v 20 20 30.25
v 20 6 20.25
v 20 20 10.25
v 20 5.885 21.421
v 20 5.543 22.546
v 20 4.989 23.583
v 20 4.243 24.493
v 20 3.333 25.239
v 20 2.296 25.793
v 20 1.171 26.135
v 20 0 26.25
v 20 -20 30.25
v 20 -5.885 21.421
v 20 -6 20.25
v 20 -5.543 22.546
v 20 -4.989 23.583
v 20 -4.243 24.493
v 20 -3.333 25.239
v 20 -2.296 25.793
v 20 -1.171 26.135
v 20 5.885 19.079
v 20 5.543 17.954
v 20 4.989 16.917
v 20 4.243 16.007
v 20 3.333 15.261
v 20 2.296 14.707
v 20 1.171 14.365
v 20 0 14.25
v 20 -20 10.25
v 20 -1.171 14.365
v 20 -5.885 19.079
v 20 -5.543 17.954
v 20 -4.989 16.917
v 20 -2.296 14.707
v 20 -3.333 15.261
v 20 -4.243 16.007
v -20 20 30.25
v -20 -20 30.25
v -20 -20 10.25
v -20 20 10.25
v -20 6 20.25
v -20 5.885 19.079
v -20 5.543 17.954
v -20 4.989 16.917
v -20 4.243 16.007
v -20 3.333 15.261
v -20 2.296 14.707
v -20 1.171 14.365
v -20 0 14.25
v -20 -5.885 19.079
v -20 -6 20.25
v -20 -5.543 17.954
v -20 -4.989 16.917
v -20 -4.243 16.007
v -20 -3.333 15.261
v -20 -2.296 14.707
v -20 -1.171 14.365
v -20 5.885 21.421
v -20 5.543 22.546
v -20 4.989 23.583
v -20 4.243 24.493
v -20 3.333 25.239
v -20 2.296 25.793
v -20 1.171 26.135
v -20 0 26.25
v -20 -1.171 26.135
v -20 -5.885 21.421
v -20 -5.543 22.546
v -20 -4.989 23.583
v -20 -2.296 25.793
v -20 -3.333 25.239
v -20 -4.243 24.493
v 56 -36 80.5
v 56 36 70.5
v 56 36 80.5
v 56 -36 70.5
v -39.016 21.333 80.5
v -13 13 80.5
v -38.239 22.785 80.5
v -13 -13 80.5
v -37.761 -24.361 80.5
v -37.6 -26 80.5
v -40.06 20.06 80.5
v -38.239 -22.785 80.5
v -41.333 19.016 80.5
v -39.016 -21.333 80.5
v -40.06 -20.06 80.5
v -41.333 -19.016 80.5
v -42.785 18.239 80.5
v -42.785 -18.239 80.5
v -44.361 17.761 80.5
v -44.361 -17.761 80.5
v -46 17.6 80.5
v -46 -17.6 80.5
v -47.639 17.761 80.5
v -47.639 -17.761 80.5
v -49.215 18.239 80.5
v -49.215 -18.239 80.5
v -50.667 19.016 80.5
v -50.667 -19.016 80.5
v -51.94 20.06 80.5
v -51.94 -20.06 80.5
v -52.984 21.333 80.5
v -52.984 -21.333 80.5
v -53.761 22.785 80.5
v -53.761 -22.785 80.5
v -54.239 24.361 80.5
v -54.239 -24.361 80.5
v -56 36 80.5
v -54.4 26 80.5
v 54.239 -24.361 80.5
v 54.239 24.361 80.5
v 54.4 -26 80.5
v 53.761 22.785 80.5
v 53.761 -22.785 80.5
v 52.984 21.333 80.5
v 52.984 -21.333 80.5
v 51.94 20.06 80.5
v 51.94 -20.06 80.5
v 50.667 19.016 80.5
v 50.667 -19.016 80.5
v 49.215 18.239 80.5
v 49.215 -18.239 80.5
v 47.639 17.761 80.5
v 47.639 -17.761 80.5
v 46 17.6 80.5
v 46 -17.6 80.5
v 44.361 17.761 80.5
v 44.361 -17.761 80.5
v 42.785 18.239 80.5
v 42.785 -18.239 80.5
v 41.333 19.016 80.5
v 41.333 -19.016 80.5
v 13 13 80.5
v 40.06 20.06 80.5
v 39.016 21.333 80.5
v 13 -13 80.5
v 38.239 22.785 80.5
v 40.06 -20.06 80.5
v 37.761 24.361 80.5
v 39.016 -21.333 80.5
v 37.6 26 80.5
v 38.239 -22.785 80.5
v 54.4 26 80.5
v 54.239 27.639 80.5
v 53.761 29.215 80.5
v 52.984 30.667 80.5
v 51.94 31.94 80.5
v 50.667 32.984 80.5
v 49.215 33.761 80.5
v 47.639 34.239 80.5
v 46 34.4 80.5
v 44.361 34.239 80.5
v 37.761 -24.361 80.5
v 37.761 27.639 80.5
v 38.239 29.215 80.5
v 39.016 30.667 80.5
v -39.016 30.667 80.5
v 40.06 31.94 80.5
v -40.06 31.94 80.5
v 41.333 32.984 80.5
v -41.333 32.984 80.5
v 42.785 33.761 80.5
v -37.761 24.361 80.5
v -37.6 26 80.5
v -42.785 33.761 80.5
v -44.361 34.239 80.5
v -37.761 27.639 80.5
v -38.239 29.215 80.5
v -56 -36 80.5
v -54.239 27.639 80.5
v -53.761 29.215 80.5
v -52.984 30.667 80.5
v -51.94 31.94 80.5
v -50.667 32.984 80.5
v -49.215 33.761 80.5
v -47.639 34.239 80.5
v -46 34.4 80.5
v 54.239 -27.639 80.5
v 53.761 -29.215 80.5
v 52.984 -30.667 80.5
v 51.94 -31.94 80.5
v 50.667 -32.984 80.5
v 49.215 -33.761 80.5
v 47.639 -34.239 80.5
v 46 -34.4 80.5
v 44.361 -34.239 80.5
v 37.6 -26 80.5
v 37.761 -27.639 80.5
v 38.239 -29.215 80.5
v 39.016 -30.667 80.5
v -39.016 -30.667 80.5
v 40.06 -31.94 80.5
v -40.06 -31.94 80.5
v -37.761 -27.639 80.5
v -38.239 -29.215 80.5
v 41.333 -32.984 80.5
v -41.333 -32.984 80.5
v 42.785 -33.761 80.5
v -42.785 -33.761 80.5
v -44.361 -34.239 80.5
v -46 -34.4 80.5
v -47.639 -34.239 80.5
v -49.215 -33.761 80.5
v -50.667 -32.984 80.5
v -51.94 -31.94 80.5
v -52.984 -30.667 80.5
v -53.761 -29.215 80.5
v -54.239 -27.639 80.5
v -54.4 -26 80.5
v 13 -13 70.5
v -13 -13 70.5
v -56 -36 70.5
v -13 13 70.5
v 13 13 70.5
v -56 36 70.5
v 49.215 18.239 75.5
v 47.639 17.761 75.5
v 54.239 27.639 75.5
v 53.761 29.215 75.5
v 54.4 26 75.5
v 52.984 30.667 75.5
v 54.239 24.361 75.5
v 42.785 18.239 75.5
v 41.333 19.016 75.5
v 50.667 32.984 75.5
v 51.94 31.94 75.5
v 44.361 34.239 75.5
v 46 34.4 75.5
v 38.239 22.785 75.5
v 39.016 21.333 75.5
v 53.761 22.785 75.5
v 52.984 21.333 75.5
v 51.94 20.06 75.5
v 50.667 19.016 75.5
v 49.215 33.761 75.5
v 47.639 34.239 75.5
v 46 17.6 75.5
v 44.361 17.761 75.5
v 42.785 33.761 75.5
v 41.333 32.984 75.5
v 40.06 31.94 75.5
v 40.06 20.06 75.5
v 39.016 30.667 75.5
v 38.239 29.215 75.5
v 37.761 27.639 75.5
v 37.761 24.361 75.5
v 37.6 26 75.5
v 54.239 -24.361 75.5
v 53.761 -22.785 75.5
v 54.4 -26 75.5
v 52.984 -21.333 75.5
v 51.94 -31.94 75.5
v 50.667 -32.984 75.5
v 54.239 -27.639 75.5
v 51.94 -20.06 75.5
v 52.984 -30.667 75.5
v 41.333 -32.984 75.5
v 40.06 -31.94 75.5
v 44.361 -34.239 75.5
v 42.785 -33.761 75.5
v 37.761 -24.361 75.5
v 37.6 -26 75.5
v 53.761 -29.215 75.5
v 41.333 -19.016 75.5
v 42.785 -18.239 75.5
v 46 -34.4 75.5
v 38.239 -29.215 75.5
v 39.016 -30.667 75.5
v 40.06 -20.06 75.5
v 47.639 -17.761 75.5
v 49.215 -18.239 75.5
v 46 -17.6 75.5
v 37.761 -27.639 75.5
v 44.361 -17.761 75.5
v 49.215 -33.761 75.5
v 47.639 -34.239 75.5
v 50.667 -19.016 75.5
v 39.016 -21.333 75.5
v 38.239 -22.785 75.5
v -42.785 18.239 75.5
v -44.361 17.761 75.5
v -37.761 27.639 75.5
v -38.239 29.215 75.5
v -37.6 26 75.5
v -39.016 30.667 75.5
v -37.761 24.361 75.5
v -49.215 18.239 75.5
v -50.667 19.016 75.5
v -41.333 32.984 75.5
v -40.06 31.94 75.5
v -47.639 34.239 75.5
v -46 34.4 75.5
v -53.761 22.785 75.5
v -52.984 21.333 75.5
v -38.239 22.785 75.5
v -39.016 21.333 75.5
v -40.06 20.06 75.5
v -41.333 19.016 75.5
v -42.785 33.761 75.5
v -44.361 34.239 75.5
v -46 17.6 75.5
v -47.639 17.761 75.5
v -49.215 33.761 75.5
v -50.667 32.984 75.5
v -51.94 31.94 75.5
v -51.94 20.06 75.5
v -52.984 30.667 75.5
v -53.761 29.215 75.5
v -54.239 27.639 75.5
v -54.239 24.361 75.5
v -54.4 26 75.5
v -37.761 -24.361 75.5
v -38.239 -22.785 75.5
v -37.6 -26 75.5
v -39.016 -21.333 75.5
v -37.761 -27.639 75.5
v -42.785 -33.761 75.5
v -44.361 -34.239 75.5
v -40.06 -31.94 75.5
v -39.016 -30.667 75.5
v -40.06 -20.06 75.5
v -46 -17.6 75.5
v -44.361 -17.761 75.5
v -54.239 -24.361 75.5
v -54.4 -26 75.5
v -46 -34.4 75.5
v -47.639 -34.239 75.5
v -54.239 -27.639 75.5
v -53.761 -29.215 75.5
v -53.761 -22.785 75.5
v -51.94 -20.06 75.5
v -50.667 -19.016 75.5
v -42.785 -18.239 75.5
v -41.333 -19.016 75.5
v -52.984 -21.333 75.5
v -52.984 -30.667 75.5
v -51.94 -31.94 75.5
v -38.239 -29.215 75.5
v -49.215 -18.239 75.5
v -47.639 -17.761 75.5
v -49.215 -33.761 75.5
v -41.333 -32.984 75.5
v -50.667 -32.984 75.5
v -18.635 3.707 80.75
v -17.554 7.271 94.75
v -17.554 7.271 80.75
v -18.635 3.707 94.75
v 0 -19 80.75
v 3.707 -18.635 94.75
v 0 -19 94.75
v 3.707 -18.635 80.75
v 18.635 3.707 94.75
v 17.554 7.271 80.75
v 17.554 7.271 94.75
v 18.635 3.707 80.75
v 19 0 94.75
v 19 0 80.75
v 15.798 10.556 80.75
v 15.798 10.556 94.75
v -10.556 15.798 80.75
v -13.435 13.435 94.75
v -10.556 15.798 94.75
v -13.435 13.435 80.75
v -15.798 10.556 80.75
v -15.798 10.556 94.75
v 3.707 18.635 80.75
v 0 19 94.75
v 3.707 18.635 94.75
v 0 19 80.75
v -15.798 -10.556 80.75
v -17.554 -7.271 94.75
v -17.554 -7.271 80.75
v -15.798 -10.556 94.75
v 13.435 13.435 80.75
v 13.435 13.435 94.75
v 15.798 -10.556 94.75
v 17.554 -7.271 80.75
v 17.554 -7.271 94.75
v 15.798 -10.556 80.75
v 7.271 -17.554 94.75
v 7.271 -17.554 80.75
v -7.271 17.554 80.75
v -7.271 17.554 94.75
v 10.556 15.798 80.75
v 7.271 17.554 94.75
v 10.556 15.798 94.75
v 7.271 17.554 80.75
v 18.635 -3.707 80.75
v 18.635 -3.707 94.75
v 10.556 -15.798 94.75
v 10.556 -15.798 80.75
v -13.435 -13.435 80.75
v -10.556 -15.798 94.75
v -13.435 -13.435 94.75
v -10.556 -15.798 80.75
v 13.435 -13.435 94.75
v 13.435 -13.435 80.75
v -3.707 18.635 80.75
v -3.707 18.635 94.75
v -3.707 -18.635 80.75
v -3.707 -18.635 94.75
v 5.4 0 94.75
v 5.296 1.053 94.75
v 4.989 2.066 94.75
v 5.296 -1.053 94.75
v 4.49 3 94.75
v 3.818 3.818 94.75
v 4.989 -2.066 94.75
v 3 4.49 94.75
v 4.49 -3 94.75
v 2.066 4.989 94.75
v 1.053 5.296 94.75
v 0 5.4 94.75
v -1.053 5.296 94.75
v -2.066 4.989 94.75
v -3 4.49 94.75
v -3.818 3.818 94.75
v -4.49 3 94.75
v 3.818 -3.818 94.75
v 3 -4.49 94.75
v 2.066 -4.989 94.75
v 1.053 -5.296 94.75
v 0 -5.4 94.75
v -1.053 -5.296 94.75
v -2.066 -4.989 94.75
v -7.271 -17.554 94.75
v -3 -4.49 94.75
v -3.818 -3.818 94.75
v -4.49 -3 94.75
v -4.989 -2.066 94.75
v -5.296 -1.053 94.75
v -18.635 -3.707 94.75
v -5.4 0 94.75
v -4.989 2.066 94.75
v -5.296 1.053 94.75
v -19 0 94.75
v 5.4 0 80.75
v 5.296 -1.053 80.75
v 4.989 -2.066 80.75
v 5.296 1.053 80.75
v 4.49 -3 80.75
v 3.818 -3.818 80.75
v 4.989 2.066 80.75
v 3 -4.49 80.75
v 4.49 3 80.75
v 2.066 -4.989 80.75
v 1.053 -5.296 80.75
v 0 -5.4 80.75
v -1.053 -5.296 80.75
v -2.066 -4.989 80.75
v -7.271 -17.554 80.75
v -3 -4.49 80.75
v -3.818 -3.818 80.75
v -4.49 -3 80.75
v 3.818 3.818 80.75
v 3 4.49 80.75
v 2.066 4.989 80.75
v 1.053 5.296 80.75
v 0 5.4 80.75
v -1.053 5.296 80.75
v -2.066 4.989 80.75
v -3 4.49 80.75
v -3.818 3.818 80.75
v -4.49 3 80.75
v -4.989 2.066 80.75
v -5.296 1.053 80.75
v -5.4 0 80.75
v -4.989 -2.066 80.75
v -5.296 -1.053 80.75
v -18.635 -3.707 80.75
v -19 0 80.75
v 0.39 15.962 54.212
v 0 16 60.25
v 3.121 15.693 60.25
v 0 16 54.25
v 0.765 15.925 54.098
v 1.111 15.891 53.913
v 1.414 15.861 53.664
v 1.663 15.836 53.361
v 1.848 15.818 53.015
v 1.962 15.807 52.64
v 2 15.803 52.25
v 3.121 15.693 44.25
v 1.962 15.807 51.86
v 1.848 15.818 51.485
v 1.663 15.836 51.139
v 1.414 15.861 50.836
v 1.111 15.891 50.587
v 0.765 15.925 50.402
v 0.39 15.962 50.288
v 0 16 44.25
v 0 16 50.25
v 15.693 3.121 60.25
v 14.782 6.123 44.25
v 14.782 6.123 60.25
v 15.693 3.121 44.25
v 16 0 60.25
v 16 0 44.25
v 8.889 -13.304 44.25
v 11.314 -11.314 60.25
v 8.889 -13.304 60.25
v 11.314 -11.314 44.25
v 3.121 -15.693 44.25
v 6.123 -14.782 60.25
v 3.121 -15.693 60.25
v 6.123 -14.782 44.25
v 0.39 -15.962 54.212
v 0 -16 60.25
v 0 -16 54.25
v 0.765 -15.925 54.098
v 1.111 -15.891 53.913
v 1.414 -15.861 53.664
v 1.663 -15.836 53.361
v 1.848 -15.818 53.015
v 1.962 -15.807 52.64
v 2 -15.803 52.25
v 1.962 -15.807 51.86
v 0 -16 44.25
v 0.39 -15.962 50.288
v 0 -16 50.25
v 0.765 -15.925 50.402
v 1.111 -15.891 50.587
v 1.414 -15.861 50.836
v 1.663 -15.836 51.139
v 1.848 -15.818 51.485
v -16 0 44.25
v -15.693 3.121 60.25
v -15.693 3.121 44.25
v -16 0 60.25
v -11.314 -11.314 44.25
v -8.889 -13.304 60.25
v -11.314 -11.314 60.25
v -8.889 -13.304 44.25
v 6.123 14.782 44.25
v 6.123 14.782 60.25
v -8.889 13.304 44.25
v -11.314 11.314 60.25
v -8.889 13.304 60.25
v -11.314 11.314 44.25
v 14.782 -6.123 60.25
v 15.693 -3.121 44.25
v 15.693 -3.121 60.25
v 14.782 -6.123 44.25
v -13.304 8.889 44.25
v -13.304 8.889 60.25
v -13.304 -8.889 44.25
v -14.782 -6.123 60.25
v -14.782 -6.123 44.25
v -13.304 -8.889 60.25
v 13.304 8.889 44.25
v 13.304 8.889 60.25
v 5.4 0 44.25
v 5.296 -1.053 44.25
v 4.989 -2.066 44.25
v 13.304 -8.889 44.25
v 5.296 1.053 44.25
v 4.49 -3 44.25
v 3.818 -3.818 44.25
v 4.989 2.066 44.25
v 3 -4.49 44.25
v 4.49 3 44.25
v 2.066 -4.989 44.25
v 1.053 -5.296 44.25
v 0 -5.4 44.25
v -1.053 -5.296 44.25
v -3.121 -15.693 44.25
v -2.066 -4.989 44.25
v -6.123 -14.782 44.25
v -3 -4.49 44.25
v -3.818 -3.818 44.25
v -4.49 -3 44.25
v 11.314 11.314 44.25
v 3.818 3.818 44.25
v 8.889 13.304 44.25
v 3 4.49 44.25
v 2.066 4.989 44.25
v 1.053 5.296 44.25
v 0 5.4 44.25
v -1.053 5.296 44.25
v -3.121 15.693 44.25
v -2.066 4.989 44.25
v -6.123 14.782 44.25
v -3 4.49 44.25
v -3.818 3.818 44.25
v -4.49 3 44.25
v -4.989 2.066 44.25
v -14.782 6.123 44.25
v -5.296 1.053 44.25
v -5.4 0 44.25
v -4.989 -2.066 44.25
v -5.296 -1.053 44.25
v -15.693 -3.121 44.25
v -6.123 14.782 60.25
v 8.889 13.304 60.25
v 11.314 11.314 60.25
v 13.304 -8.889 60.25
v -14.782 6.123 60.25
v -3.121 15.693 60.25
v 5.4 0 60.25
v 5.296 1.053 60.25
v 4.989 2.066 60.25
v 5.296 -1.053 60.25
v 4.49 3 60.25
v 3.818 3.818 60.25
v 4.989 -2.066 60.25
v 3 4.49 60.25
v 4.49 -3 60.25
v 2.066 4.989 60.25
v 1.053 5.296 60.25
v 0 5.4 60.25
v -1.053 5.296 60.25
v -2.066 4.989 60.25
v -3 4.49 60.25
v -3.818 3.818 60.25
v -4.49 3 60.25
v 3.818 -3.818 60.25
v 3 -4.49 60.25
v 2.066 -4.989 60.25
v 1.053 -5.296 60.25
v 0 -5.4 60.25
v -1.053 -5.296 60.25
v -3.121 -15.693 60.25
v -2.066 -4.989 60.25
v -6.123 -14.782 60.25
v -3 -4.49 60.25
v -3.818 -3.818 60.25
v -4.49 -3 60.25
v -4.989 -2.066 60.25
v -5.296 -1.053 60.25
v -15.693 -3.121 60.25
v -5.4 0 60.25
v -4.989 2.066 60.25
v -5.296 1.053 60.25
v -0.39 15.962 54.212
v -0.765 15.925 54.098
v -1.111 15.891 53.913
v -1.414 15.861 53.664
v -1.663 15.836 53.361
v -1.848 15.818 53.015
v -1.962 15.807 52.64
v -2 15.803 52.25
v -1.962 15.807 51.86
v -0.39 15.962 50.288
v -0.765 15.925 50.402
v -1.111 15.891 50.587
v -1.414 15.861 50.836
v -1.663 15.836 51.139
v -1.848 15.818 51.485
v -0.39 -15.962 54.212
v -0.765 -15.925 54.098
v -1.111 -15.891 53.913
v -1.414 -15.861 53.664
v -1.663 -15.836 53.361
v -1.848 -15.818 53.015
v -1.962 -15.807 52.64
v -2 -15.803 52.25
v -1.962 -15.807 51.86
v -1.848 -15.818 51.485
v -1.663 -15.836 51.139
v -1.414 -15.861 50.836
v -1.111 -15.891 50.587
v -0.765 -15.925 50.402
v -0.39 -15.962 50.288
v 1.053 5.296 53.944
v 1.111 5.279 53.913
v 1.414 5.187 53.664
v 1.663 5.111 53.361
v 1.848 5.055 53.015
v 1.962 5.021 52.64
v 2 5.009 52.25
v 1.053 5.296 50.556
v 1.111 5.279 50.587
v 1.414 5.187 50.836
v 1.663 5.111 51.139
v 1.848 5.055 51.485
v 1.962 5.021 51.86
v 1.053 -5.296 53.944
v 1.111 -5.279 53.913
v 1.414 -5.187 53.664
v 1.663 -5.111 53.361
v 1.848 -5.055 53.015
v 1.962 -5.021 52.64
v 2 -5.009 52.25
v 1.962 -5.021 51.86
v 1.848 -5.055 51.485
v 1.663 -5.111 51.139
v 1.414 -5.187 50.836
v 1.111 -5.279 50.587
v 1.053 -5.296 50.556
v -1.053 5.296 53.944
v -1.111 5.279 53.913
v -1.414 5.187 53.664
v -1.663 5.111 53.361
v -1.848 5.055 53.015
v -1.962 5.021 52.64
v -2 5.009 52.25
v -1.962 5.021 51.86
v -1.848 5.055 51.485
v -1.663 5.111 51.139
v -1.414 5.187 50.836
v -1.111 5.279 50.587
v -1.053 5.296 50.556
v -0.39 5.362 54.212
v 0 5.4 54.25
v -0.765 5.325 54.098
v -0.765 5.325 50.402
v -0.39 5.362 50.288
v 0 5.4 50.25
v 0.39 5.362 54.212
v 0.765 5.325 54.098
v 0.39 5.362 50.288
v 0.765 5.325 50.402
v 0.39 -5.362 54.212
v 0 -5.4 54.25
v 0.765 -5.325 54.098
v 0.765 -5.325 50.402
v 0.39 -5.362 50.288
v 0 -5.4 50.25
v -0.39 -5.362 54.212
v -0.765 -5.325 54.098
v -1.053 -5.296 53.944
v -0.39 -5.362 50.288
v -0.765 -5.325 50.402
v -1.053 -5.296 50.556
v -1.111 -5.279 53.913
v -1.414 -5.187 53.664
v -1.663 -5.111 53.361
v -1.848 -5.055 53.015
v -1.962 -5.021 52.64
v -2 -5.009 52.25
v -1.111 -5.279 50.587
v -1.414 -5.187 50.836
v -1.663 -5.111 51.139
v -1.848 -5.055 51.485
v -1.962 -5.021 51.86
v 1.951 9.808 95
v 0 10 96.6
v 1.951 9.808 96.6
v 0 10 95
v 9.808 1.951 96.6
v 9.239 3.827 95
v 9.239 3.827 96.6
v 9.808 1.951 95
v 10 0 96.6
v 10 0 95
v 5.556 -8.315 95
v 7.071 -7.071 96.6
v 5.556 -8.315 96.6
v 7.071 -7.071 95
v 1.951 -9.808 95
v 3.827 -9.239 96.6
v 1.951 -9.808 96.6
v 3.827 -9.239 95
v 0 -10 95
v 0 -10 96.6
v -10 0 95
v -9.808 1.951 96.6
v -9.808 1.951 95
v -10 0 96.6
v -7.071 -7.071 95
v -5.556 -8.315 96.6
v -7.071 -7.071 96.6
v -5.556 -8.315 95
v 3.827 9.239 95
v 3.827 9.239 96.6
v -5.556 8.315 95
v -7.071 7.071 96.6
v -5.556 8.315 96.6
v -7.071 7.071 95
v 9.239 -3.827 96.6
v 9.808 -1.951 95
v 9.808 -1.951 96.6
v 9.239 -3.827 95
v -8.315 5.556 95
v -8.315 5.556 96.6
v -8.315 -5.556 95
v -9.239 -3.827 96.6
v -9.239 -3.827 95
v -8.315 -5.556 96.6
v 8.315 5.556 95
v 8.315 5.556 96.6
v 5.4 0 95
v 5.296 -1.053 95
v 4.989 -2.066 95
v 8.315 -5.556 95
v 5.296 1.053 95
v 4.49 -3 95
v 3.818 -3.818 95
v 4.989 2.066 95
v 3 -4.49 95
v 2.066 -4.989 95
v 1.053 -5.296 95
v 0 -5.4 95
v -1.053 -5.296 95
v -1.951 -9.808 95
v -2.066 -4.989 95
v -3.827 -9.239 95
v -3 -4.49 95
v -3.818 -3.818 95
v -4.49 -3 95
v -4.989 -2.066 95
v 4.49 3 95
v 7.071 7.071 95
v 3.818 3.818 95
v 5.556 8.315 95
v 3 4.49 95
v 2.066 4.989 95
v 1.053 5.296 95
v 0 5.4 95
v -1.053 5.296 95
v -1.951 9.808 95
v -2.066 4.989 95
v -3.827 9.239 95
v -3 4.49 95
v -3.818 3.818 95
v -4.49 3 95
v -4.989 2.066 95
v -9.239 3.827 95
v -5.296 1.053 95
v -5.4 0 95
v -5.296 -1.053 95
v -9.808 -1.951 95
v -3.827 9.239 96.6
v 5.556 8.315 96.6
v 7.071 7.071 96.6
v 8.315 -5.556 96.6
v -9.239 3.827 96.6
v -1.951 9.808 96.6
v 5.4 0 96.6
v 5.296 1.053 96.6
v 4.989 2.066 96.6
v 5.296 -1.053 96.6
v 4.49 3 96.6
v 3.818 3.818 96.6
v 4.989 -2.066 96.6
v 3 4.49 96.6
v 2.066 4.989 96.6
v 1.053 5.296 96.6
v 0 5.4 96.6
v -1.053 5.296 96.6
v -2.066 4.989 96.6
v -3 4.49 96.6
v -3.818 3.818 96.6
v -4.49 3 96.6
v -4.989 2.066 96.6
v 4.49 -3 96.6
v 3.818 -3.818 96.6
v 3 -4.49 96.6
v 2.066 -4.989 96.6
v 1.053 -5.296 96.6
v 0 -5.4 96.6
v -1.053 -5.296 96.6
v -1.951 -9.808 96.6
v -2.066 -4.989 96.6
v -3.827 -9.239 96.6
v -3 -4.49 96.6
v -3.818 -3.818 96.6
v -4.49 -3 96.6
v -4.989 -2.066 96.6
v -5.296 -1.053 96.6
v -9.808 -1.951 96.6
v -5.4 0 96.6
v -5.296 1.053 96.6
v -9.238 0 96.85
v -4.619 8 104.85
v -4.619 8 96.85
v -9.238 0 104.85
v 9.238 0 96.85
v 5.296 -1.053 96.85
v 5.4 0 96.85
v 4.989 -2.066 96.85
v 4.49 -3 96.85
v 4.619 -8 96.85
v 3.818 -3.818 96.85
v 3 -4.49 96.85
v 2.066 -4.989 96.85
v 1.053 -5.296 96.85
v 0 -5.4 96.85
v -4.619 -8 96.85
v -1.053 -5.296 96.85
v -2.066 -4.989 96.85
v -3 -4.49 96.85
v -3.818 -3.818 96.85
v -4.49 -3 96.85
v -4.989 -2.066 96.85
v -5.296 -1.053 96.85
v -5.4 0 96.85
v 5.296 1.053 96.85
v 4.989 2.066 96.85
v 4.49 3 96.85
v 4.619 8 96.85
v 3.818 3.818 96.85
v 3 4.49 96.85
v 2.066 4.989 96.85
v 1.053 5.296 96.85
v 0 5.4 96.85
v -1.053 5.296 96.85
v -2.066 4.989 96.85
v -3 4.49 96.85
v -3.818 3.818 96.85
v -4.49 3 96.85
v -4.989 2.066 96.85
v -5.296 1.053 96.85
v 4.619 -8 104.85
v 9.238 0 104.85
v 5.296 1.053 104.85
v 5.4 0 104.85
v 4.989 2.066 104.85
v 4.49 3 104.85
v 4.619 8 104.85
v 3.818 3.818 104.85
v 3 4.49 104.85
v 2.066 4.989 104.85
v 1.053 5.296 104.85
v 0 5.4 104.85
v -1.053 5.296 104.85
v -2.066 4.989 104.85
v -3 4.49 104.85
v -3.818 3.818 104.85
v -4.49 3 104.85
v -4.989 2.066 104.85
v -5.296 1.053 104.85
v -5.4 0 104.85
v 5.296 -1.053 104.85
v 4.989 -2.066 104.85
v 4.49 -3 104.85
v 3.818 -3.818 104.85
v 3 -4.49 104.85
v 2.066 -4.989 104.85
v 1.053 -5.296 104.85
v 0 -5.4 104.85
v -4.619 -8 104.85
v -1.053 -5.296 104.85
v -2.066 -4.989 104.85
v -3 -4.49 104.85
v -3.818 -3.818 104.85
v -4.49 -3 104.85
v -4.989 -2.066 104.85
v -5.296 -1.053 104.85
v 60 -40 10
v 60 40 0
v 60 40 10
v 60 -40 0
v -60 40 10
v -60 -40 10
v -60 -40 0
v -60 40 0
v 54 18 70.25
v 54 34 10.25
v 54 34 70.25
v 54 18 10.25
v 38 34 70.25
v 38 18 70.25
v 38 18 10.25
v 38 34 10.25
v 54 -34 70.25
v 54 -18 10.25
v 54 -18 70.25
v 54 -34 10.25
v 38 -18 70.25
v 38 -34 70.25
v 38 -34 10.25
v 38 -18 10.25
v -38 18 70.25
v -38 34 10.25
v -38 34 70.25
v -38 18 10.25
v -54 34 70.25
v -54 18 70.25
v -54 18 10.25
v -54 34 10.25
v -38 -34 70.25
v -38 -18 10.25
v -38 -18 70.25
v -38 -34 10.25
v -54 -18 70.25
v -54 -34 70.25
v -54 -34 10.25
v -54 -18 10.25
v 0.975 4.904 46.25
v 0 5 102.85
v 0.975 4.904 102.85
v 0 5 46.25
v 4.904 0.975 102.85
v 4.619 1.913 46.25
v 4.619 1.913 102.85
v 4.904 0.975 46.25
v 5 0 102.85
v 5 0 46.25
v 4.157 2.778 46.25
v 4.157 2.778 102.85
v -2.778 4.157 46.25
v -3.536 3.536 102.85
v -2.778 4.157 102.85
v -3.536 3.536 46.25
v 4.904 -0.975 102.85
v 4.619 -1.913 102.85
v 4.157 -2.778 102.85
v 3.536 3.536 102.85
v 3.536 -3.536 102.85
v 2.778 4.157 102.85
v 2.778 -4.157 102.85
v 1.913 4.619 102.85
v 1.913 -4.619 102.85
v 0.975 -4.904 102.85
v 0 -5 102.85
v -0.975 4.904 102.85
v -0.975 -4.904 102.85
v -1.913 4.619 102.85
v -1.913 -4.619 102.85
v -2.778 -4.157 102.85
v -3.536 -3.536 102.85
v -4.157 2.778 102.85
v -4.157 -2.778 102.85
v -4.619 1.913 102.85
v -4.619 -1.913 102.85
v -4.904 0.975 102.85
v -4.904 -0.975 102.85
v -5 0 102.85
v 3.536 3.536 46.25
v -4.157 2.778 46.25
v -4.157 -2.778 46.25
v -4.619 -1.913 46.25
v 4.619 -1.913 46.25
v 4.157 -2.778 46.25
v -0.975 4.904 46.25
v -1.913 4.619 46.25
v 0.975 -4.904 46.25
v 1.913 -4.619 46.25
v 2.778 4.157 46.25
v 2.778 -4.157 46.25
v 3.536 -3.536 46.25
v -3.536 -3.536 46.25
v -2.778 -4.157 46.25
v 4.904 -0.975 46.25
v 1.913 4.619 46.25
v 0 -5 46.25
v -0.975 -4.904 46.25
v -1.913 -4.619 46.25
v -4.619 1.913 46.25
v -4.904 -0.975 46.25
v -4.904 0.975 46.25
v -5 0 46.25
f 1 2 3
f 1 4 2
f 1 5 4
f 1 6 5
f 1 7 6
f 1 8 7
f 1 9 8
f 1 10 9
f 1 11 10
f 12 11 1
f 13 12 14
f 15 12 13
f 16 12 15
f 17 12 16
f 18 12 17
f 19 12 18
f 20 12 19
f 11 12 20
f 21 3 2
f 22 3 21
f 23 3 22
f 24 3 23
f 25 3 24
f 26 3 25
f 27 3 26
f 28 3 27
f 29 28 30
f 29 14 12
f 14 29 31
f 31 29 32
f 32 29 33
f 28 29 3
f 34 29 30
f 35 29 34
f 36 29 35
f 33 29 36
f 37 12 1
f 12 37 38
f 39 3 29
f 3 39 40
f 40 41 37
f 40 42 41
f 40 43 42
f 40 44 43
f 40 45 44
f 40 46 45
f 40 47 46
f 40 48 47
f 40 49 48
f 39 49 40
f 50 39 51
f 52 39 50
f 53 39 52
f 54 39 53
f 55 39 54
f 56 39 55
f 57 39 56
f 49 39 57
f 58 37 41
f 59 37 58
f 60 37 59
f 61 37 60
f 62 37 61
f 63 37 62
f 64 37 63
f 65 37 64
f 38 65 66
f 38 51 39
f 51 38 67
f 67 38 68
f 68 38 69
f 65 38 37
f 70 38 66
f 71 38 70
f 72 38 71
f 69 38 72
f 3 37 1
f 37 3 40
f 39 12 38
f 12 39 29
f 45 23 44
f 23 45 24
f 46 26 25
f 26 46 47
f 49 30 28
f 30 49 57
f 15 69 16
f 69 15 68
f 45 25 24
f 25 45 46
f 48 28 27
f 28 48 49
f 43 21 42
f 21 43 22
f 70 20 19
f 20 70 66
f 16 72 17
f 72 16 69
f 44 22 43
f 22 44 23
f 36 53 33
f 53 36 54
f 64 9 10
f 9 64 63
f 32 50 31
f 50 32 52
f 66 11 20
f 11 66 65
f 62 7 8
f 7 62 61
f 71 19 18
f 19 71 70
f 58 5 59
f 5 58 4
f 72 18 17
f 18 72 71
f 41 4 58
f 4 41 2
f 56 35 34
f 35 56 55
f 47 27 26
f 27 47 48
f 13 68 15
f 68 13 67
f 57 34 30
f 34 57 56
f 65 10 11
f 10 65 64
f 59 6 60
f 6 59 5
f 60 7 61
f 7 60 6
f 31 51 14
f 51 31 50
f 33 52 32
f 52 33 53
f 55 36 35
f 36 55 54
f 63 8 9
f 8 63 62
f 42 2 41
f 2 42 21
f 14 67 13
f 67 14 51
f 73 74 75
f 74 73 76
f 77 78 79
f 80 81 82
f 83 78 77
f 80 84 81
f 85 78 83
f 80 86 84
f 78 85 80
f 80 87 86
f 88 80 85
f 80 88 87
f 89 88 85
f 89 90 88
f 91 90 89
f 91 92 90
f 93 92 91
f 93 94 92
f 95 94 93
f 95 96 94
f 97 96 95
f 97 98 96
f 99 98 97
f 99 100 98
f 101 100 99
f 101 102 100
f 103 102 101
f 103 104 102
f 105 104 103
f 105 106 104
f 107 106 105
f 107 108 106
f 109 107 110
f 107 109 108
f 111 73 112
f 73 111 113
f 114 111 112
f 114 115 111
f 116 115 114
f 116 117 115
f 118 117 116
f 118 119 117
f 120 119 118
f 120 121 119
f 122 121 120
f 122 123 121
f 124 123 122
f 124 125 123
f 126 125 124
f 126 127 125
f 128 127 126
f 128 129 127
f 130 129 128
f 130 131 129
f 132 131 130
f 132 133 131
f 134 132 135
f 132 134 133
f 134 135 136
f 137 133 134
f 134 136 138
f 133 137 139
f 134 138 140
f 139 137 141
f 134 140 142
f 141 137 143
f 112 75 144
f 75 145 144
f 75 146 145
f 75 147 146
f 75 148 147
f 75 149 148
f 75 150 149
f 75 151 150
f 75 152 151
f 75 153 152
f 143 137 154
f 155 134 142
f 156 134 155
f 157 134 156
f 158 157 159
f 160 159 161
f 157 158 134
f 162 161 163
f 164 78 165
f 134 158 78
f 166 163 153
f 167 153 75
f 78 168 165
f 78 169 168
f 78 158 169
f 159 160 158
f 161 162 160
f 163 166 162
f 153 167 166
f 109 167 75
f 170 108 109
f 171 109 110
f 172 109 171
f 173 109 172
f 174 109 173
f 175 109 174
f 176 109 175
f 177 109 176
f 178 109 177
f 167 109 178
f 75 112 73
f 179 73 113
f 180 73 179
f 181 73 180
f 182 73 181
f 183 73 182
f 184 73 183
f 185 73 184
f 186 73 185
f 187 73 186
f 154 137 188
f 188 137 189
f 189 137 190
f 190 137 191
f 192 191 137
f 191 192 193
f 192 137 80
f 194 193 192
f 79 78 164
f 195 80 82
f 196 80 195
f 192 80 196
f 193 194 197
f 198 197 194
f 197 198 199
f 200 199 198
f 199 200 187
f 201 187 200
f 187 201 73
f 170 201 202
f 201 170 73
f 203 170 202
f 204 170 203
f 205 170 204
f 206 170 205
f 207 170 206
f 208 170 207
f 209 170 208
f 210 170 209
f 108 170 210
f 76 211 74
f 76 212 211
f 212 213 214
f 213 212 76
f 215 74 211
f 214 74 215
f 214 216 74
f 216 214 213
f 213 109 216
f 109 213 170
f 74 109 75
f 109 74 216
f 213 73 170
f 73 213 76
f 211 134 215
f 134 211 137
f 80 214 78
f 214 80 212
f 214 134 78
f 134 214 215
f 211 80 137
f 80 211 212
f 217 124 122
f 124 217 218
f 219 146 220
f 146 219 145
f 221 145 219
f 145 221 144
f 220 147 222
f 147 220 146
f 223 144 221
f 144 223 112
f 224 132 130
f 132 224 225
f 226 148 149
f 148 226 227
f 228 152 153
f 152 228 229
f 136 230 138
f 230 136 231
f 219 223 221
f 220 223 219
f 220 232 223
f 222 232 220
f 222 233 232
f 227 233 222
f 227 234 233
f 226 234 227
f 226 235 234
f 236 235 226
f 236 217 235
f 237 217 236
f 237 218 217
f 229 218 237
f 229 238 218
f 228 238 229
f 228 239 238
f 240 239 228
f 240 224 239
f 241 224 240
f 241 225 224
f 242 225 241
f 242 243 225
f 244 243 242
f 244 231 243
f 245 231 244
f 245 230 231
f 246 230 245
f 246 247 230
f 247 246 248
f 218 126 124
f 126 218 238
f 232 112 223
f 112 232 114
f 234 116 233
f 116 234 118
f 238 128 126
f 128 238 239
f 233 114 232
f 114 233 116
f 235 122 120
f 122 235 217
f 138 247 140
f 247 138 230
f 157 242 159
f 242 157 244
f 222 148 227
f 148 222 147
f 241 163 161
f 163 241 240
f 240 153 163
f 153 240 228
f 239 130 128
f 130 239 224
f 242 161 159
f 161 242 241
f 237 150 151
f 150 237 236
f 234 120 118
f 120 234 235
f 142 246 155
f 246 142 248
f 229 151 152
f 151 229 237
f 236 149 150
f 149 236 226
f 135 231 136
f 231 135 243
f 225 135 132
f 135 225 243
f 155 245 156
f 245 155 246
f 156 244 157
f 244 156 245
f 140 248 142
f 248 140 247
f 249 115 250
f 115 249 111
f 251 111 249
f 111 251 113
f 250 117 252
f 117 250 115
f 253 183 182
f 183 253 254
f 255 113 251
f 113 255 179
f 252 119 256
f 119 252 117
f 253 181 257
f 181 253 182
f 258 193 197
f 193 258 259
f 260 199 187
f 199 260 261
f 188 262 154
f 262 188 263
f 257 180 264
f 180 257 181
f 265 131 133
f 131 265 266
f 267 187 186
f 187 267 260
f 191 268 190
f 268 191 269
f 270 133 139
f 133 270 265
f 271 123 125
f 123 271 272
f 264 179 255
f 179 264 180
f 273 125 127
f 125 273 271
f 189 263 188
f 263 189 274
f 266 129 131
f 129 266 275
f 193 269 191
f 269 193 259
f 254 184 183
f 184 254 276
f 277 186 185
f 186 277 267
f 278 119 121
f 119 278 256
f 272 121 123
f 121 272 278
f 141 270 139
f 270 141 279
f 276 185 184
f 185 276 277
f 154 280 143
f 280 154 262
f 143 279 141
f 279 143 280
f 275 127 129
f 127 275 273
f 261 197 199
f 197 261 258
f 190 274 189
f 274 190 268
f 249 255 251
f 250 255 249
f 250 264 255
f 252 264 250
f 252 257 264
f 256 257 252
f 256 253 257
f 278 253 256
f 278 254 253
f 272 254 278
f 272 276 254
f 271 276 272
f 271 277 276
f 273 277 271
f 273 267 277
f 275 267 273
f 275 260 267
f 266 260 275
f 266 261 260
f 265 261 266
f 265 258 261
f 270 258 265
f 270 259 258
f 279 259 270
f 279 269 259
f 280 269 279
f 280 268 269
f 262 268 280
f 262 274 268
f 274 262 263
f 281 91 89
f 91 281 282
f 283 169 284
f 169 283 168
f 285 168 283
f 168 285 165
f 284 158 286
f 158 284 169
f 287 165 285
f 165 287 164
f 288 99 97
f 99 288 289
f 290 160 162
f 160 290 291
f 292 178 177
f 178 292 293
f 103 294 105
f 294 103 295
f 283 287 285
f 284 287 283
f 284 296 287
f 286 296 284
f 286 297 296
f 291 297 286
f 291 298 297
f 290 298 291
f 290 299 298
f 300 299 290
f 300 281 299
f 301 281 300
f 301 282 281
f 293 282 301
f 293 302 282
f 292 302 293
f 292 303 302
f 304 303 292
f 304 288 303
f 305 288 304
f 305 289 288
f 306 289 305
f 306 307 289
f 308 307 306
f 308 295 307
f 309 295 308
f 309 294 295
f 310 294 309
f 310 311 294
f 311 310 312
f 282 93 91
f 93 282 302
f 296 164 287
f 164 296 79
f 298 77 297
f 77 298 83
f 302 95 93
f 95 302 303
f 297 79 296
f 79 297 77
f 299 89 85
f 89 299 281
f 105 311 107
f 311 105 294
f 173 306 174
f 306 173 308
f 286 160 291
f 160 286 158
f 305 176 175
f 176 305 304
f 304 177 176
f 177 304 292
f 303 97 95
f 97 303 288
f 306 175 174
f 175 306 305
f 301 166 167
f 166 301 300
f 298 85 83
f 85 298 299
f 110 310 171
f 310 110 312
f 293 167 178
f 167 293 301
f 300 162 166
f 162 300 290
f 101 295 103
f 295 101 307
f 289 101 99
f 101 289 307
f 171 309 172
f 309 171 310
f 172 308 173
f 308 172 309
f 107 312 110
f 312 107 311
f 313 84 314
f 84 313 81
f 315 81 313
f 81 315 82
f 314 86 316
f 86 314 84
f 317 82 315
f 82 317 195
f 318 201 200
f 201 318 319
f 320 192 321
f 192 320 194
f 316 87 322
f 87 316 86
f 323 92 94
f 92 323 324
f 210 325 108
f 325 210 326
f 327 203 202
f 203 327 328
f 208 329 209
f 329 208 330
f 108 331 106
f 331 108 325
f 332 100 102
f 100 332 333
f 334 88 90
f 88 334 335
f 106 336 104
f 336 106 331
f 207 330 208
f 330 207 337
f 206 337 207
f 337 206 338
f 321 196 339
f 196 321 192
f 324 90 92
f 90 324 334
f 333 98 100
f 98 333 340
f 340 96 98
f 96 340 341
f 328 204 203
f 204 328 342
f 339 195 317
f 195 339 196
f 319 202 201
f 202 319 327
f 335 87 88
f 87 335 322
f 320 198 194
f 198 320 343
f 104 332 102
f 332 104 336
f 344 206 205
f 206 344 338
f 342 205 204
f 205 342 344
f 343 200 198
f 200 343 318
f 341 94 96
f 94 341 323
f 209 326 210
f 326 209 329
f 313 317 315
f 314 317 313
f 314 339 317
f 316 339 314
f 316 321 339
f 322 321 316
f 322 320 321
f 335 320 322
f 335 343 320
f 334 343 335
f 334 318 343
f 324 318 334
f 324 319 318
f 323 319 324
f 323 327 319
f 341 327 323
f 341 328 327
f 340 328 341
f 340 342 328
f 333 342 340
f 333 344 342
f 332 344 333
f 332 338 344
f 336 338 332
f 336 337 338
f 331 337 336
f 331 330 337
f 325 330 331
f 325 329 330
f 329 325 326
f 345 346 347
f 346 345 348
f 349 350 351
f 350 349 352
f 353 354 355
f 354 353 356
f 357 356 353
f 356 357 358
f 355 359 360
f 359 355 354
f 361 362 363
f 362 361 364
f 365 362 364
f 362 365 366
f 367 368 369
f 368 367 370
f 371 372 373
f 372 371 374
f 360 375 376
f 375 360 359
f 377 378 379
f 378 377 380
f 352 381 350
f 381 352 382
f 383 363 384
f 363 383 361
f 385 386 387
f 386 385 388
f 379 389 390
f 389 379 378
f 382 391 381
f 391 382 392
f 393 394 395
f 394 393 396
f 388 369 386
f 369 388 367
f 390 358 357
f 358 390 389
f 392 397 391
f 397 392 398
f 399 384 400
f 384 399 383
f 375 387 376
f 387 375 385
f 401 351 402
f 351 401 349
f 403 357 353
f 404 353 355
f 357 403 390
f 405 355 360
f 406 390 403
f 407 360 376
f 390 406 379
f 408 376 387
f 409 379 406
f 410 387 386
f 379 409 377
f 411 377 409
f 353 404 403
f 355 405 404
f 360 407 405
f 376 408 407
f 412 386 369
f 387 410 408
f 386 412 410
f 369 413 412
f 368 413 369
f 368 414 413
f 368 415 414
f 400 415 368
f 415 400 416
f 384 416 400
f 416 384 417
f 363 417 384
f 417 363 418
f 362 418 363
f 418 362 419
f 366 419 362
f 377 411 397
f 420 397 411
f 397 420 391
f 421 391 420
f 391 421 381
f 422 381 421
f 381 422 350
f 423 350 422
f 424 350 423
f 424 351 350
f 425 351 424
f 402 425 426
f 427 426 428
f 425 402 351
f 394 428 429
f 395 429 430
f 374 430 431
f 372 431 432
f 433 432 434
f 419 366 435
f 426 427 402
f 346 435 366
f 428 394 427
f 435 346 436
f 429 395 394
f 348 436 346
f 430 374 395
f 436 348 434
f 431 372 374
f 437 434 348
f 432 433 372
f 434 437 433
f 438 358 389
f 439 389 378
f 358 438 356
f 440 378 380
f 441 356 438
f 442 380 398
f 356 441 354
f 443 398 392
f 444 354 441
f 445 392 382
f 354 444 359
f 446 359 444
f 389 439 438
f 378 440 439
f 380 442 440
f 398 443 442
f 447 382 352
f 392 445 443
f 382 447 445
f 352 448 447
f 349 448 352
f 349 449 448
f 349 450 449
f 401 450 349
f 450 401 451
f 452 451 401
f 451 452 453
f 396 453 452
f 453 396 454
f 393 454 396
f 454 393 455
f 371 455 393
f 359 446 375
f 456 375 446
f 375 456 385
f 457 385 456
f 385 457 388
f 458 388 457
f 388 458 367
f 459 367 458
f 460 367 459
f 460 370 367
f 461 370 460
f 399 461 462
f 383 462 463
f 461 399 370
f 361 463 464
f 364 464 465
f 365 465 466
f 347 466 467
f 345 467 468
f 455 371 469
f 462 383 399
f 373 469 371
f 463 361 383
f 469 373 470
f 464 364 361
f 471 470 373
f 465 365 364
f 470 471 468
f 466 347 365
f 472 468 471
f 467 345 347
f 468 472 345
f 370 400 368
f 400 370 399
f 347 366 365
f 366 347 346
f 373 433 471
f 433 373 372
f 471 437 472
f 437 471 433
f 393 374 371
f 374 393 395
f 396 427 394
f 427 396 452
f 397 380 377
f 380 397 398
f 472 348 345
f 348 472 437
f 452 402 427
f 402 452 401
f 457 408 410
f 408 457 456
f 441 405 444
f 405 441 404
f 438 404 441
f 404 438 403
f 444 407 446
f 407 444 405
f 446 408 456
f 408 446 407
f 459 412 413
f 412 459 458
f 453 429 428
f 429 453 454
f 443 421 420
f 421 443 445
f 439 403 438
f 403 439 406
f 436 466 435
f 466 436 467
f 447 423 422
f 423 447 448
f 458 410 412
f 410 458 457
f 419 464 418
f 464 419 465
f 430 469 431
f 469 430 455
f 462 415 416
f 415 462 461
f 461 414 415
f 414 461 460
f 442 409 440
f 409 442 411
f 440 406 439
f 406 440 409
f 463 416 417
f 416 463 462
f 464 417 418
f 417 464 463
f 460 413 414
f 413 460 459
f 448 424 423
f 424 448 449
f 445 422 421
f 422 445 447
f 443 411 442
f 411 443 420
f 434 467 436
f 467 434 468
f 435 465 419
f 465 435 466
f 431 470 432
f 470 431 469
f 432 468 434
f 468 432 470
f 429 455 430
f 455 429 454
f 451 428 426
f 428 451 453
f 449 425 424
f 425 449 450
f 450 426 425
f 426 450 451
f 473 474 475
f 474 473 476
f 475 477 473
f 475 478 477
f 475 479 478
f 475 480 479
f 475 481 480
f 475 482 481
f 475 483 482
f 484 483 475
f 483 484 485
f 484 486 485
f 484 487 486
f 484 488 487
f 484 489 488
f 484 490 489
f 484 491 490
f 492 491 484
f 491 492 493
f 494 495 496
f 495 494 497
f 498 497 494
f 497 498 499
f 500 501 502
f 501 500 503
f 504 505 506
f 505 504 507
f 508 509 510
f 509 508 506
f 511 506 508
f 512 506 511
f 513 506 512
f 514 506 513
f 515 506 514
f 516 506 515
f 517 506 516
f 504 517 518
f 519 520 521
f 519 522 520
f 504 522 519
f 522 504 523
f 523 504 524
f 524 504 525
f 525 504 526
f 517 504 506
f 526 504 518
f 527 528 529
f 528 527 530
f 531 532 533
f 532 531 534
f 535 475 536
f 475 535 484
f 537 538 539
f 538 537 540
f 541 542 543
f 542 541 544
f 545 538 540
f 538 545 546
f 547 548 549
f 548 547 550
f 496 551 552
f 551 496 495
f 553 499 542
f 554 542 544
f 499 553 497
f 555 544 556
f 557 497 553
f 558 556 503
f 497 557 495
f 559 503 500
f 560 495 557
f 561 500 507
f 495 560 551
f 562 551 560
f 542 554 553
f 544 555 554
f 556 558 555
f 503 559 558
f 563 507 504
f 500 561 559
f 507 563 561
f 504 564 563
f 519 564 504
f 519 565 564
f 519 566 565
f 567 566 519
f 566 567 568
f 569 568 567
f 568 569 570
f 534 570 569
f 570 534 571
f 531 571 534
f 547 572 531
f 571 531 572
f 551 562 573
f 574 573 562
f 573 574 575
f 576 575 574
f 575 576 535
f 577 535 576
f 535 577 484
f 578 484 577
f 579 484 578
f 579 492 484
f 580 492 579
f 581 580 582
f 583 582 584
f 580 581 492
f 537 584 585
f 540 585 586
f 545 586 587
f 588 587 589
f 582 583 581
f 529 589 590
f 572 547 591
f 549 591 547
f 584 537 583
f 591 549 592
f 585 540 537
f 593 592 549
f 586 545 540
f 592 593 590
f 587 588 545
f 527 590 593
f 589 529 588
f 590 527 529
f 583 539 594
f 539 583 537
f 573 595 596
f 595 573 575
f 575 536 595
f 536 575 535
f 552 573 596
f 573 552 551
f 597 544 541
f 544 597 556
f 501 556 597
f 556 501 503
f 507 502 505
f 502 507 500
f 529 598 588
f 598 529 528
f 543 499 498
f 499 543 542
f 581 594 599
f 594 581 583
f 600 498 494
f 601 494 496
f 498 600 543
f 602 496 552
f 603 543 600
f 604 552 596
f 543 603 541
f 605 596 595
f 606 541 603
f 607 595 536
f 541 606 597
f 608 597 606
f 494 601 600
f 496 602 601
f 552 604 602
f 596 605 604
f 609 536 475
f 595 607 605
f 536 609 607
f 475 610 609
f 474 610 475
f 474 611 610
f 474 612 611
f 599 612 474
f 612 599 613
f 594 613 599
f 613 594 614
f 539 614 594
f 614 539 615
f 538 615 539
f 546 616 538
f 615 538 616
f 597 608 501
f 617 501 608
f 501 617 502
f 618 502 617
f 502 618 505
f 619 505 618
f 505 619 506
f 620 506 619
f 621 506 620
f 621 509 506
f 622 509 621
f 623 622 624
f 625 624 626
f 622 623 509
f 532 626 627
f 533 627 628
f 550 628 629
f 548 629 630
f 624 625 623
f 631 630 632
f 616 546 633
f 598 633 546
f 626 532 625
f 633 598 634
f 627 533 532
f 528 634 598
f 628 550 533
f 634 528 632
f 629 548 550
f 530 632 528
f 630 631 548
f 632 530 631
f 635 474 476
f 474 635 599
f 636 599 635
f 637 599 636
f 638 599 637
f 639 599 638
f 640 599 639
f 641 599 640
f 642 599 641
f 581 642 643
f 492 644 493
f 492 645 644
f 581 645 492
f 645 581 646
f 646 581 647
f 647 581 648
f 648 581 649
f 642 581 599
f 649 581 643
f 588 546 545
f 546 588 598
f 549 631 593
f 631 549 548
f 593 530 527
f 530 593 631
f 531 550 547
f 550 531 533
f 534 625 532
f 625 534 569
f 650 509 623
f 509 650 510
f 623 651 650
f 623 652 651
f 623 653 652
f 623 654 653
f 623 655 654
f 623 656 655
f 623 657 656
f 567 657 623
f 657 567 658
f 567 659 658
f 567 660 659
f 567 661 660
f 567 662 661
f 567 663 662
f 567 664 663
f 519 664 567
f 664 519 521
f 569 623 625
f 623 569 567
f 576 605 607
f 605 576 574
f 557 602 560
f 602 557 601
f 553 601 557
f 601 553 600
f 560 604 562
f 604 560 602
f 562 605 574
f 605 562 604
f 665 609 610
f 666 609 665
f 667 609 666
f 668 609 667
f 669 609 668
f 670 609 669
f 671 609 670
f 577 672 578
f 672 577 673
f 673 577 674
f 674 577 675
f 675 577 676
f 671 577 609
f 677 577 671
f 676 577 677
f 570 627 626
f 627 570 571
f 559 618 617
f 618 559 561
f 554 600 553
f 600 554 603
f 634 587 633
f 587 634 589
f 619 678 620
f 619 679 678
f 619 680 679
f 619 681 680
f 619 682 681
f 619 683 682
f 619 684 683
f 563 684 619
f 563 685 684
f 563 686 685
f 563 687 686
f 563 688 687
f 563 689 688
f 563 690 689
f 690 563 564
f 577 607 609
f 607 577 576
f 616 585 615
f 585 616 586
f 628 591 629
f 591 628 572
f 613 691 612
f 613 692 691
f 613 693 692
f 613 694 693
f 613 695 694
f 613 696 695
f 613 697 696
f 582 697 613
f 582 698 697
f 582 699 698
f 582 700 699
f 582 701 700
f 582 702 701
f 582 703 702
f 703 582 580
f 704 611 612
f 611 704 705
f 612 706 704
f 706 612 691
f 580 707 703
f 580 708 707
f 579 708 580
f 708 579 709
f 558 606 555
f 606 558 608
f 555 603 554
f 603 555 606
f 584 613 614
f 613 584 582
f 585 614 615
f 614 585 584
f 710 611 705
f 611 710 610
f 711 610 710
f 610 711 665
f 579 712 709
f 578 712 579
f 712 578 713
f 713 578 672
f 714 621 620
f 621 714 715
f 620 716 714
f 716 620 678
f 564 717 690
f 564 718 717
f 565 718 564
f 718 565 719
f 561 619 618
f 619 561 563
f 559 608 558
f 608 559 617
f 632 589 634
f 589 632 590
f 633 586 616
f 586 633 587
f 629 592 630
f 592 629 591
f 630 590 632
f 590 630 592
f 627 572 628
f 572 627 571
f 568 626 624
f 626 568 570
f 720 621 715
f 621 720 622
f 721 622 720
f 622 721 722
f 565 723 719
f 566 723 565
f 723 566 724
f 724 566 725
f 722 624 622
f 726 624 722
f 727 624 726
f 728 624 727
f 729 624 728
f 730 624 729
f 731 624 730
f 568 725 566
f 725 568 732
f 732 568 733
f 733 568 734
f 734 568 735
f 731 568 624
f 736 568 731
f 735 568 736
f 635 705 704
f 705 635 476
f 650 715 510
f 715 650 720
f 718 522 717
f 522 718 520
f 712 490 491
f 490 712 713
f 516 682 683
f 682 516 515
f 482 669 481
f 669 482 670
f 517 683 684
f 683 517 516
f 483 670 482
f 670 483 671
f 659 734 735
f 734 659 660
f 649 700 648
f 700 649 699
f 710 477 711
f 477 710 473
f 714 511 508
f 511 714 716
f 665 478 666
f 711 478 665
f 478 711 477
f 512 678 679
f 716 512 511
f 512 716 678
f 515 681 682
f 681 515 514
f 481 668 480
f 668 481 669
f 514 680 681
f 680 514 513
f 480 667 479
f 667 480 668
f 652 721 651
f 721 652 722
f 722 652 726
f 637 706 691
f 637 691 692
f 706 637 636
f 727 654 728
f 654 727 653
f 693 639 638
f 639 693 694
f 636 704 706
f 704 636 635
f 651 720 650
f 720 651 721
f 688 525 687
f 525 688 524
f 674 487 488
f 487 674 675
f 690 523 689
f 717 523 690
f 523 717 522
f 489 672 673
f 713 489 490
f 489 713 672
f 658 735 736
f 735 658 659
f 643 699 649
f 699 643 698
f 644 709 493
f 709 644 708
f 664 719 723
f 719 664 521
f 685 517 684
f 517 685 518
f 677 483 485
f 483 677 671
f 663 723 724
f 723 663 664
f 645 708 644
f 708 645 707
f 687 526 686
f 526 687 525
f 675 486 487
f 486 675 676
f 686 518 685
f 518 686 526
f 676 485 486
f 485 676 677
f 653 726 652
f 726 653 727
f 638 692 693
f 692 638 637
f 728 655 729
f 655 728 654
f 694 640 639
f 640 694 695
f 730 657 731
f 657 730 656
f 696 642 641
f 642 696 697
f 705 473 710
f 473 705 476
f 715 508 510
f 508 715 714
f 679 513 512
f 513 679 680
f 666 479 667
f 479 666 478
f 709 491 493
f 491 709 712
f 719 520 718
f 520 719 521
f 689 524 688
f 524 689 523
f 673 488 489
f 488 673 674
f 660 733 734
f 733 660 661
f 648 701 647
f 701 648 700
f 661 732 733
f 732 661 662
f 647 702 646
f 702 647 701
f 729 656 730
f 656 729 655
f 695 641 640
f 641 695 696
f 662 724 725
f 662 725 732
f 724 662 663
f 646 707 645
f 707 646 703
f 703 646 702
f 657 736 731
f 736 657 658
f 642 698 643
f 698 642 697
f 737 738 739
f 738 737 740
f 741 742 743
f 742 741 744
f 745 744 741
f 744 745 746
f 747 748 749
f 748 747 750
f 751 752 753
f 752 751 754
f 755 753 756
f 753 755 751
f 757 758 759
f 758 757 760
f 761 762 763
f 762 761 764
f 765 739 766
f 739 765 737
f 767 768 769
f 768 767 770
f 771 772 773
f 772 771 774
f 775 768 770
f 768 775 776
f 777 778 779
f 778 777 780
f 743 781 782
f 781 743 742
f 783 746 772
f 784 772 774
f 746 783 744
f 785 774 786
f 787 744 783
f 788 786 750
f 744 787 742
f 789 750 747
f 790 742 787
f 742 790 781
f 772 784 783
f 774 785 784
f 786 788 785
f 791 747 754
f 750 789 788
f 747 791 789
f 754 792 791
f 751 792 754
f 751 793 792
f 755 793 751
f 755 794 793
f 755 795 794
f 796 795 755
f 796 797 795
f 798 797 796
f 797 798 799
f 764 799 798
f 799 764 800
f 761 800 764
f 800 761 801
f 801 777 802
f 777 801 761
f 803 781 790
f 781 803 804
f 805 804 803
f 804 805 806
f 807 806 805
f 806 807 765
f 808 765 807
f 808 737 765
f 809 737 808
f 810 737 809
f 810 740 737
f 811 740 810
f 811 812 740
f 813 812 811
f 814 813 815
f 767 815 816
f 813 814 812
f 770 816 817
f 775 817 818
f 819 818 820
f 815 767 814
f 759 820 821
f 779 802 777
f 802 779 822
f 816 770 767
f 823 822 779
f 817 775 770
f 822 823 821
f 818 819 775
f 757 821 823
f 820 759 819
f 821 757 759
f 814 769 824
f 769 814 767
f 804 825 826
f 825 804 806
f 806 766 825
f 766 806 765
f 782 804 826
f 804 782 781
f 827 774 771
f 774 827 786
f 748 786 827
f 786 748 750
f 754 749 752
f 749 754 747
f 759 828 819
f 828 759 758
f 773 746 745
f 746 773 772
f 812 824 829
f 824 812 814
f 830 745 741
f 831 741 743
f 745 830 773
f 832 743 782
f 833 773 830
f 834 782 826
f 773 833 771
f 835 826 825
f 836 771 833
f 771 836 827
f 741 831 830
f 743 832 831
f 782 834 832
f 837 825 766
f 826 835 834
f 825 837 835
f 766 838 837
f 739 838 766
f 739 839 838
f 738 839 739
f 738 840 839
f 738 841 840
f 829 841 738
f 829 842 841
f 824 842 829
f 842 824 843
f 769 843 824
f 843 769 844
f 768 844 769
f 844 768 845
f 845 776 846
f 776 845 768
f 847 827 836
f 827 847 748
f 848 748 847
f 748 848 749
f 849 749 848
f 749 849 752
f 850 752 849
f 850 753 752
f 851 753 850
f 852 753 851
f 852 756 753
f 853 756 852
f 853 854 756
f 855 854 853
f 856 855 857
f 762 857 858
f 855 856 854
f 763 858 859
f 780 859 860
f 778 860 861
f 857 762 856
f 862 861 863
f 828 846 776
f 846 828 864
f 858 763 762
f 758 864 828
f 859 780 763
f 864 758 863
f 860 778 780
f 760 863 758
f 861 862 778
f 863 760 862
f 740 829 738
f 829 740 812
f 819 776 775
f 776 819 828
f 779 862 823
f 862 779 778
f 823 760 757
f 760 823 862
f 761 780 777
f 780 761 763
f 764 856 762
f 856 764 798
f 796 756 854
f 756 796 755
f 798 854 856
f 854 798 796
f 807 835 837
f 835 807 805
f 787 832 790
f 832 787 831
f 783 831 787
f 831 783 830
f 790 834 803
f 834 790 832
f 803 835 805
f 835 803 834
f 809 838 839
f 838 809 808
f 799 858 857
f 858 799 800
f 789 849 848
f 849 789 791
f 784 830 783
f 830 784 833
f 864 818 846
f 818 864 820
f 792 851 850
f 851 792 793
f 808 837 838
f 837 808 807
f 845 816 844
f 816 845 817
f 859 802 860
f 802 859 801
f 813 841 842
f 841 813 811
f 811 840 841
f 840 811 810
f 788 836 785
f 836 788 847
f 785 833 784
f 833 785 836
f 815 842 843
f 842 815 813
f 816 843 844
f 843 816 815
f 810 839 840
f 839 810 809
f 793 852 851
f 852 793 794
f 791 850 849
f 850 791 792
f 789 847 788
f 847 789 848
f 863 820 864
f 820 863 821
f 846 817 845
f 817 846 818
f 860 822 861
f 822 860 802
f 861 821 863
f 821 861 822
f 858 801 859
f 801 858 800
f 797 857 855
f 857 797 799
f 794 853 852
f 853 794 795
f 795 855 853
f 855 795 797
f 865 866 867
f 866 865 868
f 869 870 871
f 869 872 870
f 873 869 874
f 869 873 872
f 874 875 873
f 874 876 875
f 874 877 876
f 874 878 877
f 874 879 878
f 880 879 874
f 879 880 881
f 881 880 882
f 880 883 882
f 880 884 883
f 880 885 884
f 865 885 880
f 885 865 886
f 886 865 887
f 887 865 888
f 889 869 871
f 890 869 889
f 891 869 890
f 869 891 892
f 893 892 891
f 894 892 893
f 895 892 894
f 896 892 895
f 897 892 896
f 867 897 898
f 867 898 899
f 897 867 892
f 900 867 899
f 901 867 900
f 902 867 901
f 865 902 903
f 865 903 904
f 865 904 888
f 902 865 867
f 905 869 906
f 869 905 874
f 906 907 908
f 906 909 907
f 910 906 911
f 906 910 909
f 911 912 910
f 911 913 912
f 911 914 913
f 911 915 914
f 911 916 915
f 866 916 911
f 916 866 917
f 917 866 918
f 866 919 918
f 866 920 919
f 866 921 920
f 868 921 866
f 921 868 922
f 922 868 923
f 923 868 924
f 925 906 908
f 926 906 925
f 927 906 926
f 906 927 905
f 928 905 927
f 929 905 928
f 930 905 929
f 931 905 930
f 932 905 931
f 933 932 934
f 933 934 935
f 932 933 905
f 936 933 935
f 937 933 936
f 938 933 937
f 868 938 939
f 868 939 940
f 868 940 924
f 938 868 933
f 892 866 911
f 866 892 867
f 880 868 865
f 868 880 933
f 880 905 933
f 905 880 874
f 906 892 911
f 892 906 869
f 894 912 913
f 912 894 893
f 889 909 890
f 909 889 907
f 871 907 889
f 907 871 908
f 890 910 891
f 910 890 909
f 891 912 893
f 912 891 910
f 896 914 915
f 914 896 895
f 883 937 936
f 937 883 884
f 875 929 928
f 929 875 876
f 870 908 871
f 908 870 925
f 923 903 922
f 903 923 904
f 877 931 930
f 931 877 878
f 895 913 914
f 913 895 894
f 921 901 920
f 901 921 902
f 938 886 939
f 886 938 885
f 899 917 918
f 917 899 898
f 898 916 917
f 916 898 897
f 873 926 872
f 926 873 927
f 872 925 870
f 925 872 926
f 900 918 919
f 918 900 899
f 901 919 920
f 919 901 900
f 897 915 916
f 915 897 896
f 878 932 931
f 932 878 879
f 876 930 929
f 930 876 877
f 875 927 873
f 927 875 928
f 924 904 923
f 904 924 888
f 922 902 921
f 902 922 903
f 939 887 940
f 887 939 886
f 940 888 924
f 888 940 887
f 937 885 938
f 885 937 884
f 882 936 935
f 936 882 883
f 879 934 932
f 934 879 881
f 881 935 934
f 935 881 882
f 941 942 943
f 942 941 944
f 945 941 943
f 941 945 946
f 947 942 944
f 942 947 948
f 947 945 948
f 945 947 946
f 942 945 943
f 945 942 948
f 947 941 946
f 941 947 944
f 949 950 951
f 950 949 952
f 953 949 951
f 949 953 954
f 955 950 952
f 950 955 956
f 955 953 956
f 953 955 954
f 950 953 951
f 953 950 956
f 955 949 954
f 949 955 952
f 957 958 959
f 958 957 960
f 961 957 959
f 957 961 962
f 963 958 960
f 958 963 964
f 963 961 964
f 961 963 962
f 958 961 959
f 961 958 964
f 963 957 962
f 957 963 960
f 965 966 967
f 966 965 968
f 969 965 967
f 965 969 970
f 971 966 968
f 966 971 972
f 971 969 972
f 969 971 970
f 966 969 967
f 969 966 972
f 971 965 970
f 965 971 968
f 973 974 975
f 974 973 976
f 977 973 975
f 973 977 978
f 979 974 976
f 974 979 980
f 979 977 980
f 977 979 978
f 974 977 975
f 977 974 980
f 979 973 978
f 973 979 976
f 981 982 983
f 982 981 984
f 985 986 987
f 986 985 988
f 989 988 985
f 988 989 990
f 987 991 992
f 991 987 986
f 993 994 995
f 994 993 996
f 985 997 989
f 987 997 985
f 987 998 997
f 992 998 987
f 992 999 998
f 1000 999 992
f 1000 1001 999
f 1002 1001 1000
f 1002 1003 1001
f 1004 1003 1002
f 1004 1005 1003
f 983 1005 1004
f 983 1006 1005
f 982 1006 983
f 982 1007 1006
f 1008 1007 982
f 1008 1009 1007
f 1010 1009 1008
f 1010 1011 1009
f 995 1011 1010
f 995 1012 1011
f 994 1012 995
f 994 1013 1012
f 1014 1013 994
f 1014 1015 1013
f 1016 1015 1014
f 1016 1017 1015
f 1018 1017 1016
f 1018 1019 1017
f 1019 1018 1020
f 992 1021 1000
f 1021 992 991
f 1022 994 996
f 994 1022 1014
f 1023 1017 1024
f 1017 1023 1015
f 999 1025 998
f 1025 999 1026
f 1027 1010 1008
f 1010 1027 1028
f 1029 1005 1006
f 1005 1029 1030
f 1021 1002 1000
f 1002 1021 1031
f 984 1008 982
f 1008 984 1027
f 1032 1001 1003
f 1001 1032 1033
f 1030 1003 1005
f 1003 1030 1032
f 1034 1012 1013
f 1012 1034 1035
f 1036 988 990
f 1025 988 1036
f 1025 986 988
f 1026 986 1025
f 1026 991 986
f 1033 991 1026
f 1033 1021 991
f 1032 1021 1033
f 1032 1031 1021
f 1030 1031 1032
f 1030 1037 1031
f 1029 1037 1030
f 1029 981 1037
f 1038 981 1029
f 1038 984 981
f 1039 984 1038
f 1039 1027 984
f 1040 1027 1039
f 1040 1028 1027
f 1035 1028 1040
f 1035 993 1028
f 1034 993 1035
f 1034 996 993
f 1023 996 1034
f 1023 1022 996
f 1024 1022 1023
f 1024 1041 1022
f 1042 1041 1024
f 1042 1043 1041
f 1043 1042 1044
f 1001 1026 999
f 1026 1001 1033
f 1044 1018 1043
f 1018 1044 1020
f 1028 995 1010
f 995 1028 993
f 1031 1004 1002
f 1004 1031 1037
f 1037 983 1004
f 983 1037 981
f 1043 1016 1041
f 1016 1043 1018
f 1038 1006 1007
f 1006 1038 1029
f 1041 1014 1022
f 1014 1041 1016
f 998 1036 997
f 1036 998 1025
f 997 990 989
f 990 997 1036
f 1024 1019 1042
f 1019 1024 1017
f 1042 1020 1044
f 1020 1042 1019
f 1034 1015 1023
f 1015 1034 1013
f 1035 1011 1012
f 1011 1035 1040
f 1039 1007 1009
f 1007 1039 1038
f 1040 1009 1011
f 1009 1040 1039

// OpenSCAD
$fn = 32;

// ------------------------------------------------------------------------
// Arbor press fixture: screw d10, posts 60 mm, gap 14 mm
// Every part is its own module, assembly() places every instance.
// ------------------------------------------------------------------------

// --- part 1 ---
module press_bed() {
  difference() {
    translate([-60, -40, 0]) cube([120, 80, 10]);
  }
}

// --- part 2 ---
module anvil_block() {
  difference() {
    translate([-20, -20, 0]) cube([40, 40, 20]);
    translate([0, 0, 10]) rotate([0, 90, 0]) cylinder(h = 42, d = 12, center = true);
  }
}

// --- part 3 ---
module press_post_a() {
  translate([-8, -8, 0]) cube([16, 16, 60]);
}

// --- part 4 ---
module press_post_b() {
  translate([-8, -8, 0]) cube([16, 16, 60]);
}

// --- part 5 ---
module press_post_c() {
  translate([-8, -8, 0]) cube([16, 16, 60]);
}

// --- part 6 ---
module press_post_d() {
  translate([-8, -8, 0]) cube([16, 16, 60]);
}

// --- part 7 ---
module press_frame() {
  difference() {
    translate([-56, -36, 0]) cube([112, 72, 10]);
    translate([-13, -13, -1]) cube([26, 26, 12]);
    translate([46, 26, 5]) cylinder(h = 6, d = 16.8);
    translate([46, -26, 5]) cylinder(h = 6, d = 16.8);
    translate([-46, 26, 5]) cylinder(h = 6, d = 16.8);
    translate([-46, -26, 5]) cylinder(h = 6, d = 16.8);
  }
}

// --- part 8 ---
module guide_ring() {
  difference() {
      translate([0, 0, 0]) cylinder(h = 14, d = 38);
      translate([0, 0, -1]) cylinder(h = 16, d = 10.8);
    }
}

// --- part 9 ---
module press_screw() {
  translate([0, 0, -28.3]) cylinder(h = 56.6, d = 10);
}

// --- part 10 ---
module press_head() {
  difference() {
    cylinder(h = 16, d = 32);
    translate([0, 0, -1]) cylinder(h = 18, d = 10.8);
    translate([0, 0, 8]) rotate([90, 0, 0]) cylinder(h = 34, d = 4, center = true);
  }
}

// --- part 11 ---
module nut_washer() {
  difference() {
      translate([0, 0, 0]) cylinder(h = 1.6, d = 20);
      translate([0, 0, -1]) cylinder(h = 3.6, d = 10.8);
    }
}

// --- part 12 ---
module press_nut() {
  difference() {
    linear_extrude(height = 8) polygon(points = [[9.238, 0], [4.619, 8], [-4.619, 8], [-9.238, 0], [-4.619, -8], [4.619, -8]]);
    translate([0, 0, -1]) cylinder(h = 10, d = 10.8);
  }
}

// --- assembly ---
module assembly() {
  color([0.80, 0.24, 0.20]) translate([0, 0, 0]) rotate([0, 0, 0]) press_bed();
  color([0.20, 0.45, 0.75]) translate([0, 0, 10.25]) rotate([0, 0, 0]) anvil_block();
  color([0.25, 0.62, 0.32]) translate([46, 26, 10.25]) rotate([0, 0, 0]) press_post_a();
  color([0.92, 0.70, 0.18]) translate([46, -26, 10.25]) rotate([0, 0, 0]) press_post_b();
  color([0.58, 0.35, 0.70]) translate([-46, 26, 10.25]) rotate([0, 0, 0]) press_post_c();
  color([0.16, 0.66, 0.66]) translate([-46, -26, 10.25]) rotate([0, 0, 0]) press_post_d();
  color([0.85, 0.48, 0.18]) translate([0, 0, 70.5]) rotate([0, 0, 0]) press_frame();
  color([0.55, 0.60, 0.65]) translate([0, 0, 80.75]) rotate([0, 0, 0]) guide_ring();
  color([0.75, 0.30, 0.55]) translate([0, 0, 74.55]) rotate([0, 0, 0]) press_screw();
  color([0.42, 0.52, 0.28]) translate([0, 0, 44.25]) rotate([0, 0, 0]) press_head();
  color([0.80, 0.24, 0.20]) translate([0, 0, 95]) rotate([0, 0, 0]) nut_washer();
  color([0.20, 0.45, 0.75]) translate([0, 0, 96.85]) rotate([0, 0, 0]) press_nut();
}

assembly();
